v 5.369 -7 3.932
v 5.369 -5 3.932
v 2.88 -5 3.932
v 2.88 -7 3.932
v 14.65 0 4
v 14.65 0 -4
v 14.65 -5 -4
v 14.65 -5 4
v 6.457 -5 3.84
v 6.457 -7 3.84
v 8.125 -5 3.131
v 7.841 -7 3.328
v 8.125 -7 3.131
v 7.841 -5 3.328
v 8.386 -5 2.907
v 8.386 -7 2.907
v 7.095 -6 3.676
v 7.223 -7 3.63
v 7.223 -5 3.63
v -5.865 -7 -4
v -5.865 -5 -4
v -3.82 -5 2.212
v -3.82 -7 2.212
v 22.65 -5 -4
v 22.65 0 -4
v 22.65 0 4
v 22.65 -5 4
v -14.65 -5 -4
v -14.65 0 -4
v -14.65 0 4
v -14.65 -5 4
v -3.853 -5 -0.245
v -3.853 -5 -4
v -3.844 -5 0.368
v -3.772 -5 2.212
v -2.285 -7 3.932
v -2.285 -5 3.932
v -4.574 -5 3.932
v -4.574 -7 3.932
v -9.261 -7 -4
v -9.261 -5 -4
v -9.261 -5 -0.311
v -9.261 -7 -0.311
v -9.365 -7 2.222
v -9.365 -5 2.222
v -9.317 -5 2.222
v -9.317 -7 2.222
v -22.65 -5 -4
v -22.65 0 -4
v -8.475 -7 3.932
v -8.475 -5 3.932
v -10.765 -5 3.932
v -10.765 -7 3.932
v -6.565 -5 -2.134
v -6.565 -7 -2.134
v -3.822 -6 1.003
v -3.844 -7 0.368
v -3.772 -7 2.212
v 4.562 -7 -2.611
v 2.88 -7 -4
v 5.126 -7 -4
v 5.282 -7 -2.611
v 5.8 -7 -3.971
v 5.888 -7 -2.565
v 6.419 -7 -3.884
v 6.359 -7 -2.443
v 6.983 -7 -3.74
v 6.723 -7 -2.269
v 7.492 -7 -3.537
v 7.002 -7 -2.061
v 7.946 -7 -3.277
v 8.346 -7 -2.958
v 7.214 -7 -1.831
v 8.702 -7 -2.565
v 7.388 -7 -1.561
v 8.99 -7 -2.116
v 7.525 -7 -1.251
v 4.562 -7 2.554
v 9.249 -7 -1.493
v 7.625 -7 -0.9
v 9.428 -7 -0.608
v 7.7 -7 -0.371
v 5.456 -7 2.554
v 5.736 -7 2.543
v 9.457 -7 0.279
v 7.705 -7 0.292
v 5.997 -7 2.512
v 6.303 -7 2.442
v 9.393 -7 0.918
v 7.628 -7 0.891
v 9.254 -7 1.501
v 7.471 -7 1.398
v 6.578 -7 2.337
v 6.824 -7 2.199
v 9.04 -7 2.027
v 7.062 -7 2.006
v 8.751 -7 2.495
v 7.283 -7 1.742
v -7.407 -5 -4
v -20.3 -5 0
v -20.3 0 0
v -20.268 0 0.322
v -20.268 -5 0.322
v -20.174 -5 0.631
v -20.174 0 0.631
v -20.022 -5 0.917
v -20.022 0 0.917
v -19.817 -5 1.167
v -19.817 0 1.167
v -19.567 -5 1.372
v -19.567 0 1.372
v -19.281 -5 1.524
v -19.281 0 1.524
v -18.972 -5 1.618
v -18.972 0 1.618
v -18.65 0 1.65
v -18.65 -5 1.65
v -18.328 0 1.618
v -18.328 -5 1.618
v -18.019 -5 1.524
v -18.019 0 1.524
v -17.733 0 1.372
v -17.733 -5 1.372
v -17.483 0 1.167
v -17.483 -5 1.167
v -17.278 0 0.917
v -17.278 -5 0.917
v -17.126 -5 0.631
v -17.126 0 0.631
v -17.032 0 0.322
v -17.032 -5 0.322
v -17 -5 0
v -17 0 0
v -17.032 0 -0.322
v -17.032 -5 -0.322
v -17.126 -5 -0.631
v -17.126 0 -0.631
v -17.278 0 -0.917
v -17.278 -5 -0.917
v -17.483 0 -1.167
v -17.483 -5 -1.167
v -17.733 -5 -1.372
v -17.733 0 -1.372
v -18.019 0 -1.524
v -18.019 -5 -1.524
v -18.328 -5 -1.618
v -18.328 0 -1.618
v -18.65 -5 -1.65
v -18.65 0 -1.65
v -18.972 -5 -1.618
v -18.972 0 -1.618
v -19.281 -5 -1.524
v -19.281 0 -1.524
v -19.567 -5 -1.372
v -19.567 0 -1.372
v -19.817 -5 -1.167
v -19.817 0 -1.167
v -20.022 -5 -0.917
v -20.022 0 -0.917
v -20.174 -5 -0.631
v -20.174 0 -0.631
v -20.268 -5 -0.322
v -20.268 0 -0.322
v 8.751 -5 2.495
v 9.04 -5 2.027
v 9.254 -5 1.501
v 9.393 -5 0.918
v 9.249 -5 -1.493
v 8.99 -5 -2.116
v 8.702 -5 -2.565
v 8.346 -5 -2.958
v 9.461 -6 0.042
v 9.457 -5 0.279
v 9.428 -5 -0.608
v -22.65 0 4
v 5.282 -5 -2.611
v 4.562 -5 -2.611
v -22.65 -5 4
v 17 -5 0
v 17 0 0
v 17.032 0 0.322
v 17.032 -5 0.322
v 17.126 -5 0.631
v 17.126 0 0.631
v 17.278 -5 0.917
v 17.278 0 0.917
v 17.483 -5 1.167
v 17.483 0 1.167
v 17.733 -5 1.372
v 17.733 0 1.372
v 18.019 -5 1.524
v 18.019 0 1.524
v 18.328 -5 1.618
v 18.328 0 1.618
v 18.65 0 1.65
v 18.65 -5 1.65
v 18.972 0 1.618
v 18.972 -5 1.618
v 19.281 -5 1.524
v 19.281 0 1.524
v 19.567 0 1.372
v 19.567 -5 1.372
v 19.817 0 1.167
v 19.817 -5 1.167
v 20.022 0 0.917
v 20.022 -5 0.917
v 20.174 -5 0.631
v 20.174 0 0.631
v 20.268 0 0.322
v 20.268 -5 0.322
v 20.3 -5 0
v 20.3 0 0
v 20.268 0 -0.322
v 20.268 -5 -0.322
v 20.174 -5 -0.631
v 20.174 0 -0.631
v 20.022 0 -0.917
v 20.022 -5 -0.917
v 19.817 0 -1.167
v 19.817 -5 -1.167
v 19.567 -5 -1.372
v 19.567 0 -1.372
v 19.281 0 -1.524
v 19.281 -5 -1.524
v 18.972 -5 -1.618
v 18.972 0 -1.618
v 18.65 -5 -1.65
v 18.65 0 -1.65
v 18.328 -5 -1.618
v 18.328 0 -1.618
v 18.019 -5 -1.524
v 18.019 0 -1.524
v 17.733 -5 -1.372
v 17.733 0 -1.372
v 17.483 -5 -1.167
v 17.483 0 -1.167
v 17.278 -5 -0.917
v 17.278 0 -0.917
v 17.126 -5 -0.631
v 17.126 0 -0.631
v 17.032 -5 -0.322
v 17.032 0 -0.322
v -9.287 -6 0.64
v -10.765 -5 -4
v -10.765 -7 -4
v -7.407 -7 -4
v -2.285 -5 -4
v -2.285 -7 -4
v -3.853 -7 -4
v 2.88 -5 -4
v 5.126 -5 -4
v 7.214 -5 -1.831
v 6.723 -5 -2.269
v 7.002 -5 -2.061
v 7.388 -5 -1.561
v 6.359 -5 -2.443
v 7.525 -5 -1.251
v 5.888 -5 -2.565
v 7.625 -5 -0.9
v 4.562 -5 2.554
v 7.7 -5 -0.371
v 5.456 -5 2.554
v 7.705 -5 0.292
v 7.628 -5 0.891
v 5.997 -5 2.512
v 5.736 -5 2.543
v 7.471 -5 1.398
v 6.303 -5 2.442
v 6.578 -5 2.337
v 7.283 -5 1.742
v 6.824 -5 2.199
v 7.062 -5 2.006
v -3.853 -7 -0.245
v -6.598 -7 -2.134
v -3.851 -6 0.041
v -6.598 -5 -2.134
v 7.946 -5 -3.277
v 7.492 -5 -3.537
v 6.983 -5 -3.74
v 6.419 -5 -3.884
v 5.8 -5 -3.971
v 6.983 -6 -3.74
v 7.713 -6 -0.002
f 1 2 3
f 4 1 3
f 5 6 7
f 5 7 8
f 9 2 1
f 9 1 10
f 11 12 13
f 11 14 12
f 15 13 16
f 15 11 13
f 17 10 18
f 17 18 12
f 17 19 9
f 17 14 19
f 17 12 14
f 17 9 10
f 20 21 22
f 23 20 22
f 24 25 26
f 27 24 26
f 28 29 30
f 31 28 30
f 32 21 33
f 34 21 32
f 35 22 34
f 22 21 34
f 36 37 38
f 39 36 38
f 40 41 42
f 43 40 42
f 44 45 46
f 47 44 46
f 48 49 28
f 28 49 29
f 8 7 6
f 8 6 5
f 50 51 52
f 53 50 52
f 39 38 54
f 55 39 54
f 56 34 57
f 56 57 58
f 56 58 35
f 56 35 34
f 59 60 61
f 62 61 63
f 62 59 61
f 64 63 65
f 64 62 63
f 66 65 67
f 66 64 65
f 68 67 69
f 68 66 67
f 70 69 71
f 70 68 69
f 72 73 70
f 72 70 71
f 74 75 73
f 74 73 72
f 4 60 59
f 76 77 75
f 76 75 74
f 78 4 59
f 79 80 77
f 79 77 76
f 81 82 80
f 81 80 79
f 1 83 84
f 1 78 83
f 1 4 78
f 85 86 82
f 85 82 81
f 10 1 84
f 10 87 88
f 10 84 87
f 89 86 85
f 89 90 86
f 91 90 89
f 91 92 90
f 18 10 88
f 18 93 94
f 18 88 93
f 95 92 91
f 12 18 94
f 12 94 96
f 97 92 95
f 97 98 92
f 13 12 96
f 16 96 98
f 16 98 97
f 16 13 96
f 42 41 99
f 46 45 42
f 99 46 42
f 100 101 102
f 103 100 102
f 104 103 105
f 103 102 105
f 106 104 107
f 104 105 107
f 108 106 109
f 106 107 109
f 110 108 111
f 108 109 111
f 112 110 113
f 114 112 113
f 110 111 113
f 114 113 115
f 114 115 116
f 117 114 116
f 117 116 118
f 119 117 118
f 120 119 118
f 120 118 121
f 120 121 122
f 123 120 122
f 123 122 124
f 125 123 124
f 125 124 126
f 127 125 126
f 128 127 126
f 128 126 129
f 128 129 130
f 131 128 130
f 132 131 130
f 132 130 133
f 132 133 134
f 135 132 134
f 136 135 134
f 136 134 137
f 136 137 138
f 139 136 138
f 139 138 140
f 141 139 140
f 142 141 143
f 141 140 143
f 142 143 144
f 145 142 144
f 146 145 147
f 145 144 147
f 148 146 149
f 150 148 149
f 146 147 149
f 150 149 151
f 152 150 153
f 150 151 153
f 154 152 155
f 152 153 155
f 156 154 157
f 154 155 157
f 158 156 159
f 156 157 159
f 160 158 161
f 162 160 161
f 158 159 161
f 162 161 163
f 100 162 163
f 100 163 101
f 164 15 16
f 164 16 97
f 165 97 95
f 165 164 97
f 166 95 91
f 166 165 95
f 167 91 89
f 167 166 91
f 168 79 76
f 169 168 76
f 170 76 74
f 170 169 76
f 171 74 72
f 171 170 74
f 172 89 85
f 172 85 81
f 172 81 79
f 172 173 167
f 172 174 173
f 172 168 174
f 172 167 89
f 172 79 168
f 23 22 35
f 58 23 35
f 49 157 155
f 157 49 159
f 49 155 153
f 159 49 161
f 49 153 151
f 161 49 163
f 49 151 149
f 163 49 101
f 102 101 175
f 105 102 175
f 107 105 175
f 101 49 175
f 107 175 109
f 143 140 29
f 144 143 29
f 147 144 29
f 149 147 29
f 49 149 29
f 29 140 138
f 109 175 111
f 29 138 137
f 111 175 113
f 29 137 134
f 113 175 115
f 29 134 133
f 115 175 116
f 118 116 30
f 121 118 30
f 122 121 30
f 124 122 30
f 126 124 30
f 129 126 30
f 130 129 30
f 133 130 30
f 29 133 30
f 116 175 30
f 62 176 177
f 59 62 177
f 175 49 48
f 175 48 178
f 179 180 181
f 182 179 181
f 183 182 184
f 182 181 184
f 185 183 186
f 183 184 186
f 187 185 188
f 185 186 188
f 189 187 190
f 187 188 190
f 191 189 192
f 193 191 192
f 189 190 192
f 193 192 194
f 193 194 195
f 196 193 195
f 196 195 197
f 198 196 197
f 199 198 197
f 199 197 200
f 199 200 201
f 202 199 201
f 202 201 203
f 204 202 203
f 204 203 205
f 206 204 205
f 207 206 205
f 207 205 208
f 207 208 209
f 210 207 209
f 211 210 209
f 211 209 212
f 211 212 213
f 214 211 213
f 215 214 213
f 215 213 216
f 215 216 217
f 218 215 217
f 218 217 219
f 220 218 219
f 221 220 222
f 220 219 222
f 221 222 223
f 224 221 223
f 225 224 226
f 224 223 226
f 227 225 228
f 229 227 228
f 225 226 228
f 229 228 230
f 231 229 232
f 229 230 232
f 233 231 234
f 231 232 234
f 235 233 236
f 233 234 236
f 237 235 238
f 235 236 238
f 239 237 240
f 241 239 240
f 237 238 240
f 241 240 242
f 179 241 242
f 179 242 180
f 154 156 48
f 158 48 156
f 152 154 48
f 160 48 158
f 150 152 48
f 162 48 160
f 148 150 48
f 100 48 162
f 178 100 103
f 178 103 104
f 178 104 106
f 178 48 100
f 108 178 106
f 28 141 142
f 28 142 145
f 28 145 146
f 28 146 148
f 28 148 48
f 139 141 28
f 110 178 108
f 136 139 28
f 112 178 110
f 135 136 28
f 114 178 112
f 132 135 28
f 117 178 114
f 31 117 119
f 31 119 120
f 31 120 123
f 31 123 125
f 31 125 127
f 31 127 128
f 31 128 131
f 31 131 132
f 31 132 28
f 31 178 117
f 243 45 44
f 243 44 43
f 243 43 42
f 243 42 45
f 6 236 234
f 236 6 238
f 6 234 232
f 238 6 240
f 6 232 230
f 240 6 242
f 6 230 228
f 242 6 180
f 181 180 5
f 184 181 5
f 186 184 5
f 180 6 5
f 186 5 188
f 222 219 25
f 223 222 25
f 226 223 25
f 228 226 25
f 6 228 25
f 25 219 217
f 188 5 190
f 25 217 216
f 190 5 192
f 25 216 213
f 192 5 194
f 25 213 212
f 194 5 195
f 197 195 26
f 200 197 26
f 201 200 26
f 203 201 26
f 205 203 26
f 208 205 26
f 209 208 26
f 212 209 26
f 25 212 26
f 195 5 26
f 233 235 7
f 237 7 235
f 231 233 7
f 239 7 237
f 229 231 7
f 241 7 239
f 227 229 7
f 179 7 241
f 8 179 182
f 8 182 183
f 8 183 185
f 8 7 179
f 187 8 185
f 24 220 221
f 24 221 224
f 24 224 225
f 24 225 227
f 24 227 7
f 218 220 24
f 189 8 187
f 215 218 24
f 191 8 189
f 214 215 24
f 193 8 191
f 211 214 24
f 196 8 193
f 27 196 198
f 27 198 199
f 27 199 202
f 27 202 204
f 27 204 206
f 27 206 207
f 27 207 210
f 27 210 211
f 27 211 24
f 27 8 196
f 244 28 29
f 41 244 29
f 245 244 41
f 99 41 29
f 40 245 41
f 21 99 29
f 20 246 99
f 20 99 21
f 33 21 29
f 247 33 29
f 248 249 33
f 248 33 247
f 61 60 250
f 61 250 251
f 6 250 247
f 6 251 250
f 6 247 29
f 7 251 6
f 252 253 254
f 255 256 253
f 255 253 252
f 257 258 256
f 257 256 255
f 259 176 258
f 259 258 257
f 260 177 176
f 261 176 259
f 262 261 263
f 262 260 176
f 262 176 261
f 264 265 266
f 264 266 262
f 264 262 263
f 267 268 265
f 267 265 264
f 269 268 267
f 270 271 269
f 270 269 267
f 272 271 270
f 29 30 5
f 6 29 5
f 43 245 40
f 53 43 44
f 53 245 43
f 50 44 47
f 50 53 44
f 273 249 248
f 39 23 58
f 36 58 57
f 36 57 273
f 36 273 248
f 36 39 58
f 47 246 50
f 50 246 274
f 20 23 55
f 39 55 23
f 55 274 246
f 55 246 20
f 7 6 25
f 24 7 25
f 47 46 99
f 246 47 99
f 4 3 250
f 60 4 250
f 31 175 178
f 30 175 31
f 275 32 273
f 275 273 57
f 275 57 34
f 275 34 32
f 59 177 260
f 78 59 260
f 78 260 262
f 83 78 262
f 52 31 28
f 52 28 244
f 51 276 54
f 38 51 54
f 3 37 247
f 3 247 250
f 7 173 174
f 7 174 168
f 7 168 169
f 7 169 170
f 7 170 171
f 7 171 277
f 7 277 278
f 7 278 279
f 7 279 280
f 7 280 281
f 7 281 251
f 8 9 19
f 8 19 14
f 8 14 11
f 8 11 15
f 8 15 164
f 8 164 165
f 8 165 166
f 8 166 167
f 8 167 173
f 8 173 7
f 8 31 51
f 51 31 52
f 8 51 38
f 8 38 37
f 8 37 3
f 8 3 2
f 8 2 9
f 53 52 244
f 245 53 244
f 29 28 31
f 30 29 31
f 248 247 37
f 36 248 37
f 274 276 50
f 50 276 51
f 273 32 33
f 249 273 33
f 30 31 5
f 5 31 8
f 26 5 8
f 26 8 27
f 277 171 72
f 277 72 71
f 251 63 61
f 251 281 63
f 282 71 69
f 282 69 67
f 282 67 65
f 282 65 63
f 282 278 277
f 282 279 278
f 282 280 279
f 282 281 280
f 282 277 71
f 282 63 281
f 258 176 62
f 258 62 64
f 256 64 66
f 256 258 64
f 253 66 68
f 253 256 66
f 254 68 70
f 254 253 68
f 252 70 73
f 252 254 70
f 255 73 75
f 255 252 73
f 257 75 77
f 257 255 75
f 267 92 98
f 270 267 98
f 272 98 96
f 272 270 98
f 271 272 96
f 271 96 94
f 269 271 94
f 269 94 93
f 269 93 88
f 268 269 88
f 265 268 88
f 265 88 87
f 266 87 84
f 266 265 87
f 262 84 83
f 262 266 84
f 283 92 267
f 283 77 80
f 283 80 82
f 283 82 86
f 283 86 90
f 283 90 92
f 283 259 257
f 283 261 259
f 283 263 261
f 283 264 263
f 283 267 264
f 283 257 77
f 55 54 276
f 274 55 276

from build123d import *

# Parameters (mm, degrees)
F0_W       = 8
F0_H       = 8
F1_DEPTH   = 5
F3_D       = 3.3
F3_DEPTH   = 25
F3_TIP     = 0.9914200214
F3_2_D     = 3.3
F3_2_DEPTH = 25
F3_2_TIP   = 0.9914200214
F4_W       = 29.3
F4_H       = 8
F5_DEPTH   = 5
F7_DEPTH   = 2


with BuildPart() as f1:
    # F0 (on Front) → F1 (new body)
    with BuildSketch(Plane.XZ):
        with Locations((-18.65, 0)):
            Rectangle(F0_W, F0_H)
    extrude(amount=F1_DEPTH)

    # F3
    with Locations(Plane.XZ.offset(5)):
        with Locations((-18.65, 0), (18.65, 0)):
            Hole(F3_D / 2, depth=F3_DEPTH)
            with Locations((0, 0, -(F3_DEPTH + F3_TIP / 2))):  # 118° drill point
                Cone(0, F3_D / 2, F3_TIP, mode=Mode.SUBTRACT)


with BuildPart() as f1b:
    # F0 (on Front) → F1, piece 2 (new body)
    with BuildSketch(Plane.XZ):
        with Locations((18.65, 0)):
            Rectangle(F0_W, F0_H)
    extrude(amount=F1_DEPTH)

    # F3#2
    with Locations(Plane.XZ.offset(5)):
        with Locations((-18.65, 0), (18.65, 0)):
            Hole(F3_2_D / 2, depth=F3_2_DEPTH)
            with Locations((0, 0, -(F3_2_DEPTH + F3_2_TIP / 2))):  # 118° drill point
                Cone(0, F3_2_D / 2, F3_2_TIP, mode=Mode.SUBTRACT)


with BuildPart() as f5:
    # F4 (on face) → F5 (new body)
    with BuildSketch(Plane.XZ.offset(5)):
        Rectangle(F4_W, F4_H)
    extrude(amount=-F5_DEPTH)

    # F6 (on face) → F7 (join)
    with BuildSketch(Plane.XZ.offset(5)):
        with BuildLine():
            Line((-9.3166666667, 2.2222222222), (-7.4069444444, -4))
            Line((-7.4069444444, -4), (-5.8652777778, -4))
            Line((-5.8652777778, -4), (-3.8201388889, 2.2118055556))
            Line((-3.8201388889, 2.2118055556), (-3.7715277778, 2.2118055556))
            add(Edge.make_bspline(
                [(-3.8444444444, 0.3680555556), (-3.8357638889, 0.7152777778), (-3.7715277778, 2.2118055556)],
                knots=[0, 0, 0, 1, 1, 1], degree=2))
            add(Edge.make_bspline(
                [(-3.853125, -0.2447916667), (-3.853125, 0.0208333333), (-3.8444444444, 0.3680555556)],
                knots=[0, 0, 0, 1, 1, 1], degree=2))
            Line((-3.853125, -0.2447916667), (-3.853125, -4))
            Line((-3.853125, -4), (-2.2854166667, -4))
            Line((-2.2854166667, -4), (-2.2854166667, 3.9322916667))
            Line((-2.2854166667, 3.9322916667), (-4.5736111111, 3.9322916667))
            Line((-4.5736111111, 3.9322916667), (-6.5649305556, -2.1336805556))
            Line((-6.5649305556, -2.1336805556), (-6.5979166667, -2.1336805556))
            Line((-6.5979166667, -2.1336805556), (-8.4746527778, 3.9322916667))
            Line((-8.4746527778, 3.9322916667), (-10.7645833333, 3.9322916667))
            Line((-10.7645833333, 3.9322916667), (-10.7645833333, -4))
            Line((-10.7645833333, -4), (-9.2611111111, -4))
            Line((-9.2611111111, -4), (-9.2611111111, -0.3107638889))
            add(Edge.make_bspline(
                [(-9.3652777778, 2.2222222222), (-9.2611111111, 0.3246527778), (-9.2611111111, -0.3107638889)],
                knots=[0, 0, 0, 1, 1, 1], degree=2))
            Line((-9.3652777778, 2.2222222222), (-9.3166666667, 2.2222222222))
        make_face()
        with BuildLine():
            Line((2.8795138889, 3.9322916667), (2.8795138889, -4))
            Line((2.8795138889, -4), (5.1260416667, -4))
            add(Edge.make_bspline(
                [(8.3456597222, -2.9583333333), (7.2302083333, -4), (5.1260416667, -4)],
                knots=[0, 0, 0, 1, 1, 1], degree=2))
            add(Edge.make_bspline(
                [(9.4611111111, 0.0416666667), (9.4611111111, -1.9166666667), (8.3456597222, -2.9583333333)],
                knots=[0, 0, 0, 1, 1, 1], degree=2))
            add(Edge.make_bspline(
                [(8.3864583333, 2.9071180556), (9.4611111111, 1.8819444444), (9.4611111111, 0.0416666667)],
                knots=[0, 0, 0, 1, 1, 1], degree=2))
            add(Edge.make_bspline(
                [(5.3690972222, 3.9322916667), (7.3118055556, 3.9322916667), (8.3864583333, 2.9071180556)],
                knots=[0, 0, 0, 1, 1, 1], degree=2))
            Line((5.3690972222, 3.9322916667), (2.8795138889, 3.9322916667))
        make_face()
        with BuildLine():
            add(Edge.make_bspline(
                [(7.7128472222, -0.0017361111), (7.7128472222, 2.5538194444), (5.4559027778, 2.5538194444)],
                knots=[0, 0, 0, 1, 1, 1], degree=2))
            add(Edge.make_bspline(
                [(5.2822916667, -2.6111111111), (7.7128472222, -2.6111111111), (7.7128472222, -0.0017361111)],
                knots=[0, 0, 0, 1, 1, 1], degree=2))
            Line((5.2822916667, -2.6111111111), (4.5618055556, -2.6111111111))
            Line((4.5618055556, -2.6111111111), (4.5618055556, 2.5538194444))
            Line((4.5618055556, 2.5538194444), (5.4559027778, 2.5538194444))
        make_face(mode=Mode.SUBTRACT)
    extrude(amount=F7_DEPTH)


solid = Compound([f1.part, f1b.part, f5.part])
